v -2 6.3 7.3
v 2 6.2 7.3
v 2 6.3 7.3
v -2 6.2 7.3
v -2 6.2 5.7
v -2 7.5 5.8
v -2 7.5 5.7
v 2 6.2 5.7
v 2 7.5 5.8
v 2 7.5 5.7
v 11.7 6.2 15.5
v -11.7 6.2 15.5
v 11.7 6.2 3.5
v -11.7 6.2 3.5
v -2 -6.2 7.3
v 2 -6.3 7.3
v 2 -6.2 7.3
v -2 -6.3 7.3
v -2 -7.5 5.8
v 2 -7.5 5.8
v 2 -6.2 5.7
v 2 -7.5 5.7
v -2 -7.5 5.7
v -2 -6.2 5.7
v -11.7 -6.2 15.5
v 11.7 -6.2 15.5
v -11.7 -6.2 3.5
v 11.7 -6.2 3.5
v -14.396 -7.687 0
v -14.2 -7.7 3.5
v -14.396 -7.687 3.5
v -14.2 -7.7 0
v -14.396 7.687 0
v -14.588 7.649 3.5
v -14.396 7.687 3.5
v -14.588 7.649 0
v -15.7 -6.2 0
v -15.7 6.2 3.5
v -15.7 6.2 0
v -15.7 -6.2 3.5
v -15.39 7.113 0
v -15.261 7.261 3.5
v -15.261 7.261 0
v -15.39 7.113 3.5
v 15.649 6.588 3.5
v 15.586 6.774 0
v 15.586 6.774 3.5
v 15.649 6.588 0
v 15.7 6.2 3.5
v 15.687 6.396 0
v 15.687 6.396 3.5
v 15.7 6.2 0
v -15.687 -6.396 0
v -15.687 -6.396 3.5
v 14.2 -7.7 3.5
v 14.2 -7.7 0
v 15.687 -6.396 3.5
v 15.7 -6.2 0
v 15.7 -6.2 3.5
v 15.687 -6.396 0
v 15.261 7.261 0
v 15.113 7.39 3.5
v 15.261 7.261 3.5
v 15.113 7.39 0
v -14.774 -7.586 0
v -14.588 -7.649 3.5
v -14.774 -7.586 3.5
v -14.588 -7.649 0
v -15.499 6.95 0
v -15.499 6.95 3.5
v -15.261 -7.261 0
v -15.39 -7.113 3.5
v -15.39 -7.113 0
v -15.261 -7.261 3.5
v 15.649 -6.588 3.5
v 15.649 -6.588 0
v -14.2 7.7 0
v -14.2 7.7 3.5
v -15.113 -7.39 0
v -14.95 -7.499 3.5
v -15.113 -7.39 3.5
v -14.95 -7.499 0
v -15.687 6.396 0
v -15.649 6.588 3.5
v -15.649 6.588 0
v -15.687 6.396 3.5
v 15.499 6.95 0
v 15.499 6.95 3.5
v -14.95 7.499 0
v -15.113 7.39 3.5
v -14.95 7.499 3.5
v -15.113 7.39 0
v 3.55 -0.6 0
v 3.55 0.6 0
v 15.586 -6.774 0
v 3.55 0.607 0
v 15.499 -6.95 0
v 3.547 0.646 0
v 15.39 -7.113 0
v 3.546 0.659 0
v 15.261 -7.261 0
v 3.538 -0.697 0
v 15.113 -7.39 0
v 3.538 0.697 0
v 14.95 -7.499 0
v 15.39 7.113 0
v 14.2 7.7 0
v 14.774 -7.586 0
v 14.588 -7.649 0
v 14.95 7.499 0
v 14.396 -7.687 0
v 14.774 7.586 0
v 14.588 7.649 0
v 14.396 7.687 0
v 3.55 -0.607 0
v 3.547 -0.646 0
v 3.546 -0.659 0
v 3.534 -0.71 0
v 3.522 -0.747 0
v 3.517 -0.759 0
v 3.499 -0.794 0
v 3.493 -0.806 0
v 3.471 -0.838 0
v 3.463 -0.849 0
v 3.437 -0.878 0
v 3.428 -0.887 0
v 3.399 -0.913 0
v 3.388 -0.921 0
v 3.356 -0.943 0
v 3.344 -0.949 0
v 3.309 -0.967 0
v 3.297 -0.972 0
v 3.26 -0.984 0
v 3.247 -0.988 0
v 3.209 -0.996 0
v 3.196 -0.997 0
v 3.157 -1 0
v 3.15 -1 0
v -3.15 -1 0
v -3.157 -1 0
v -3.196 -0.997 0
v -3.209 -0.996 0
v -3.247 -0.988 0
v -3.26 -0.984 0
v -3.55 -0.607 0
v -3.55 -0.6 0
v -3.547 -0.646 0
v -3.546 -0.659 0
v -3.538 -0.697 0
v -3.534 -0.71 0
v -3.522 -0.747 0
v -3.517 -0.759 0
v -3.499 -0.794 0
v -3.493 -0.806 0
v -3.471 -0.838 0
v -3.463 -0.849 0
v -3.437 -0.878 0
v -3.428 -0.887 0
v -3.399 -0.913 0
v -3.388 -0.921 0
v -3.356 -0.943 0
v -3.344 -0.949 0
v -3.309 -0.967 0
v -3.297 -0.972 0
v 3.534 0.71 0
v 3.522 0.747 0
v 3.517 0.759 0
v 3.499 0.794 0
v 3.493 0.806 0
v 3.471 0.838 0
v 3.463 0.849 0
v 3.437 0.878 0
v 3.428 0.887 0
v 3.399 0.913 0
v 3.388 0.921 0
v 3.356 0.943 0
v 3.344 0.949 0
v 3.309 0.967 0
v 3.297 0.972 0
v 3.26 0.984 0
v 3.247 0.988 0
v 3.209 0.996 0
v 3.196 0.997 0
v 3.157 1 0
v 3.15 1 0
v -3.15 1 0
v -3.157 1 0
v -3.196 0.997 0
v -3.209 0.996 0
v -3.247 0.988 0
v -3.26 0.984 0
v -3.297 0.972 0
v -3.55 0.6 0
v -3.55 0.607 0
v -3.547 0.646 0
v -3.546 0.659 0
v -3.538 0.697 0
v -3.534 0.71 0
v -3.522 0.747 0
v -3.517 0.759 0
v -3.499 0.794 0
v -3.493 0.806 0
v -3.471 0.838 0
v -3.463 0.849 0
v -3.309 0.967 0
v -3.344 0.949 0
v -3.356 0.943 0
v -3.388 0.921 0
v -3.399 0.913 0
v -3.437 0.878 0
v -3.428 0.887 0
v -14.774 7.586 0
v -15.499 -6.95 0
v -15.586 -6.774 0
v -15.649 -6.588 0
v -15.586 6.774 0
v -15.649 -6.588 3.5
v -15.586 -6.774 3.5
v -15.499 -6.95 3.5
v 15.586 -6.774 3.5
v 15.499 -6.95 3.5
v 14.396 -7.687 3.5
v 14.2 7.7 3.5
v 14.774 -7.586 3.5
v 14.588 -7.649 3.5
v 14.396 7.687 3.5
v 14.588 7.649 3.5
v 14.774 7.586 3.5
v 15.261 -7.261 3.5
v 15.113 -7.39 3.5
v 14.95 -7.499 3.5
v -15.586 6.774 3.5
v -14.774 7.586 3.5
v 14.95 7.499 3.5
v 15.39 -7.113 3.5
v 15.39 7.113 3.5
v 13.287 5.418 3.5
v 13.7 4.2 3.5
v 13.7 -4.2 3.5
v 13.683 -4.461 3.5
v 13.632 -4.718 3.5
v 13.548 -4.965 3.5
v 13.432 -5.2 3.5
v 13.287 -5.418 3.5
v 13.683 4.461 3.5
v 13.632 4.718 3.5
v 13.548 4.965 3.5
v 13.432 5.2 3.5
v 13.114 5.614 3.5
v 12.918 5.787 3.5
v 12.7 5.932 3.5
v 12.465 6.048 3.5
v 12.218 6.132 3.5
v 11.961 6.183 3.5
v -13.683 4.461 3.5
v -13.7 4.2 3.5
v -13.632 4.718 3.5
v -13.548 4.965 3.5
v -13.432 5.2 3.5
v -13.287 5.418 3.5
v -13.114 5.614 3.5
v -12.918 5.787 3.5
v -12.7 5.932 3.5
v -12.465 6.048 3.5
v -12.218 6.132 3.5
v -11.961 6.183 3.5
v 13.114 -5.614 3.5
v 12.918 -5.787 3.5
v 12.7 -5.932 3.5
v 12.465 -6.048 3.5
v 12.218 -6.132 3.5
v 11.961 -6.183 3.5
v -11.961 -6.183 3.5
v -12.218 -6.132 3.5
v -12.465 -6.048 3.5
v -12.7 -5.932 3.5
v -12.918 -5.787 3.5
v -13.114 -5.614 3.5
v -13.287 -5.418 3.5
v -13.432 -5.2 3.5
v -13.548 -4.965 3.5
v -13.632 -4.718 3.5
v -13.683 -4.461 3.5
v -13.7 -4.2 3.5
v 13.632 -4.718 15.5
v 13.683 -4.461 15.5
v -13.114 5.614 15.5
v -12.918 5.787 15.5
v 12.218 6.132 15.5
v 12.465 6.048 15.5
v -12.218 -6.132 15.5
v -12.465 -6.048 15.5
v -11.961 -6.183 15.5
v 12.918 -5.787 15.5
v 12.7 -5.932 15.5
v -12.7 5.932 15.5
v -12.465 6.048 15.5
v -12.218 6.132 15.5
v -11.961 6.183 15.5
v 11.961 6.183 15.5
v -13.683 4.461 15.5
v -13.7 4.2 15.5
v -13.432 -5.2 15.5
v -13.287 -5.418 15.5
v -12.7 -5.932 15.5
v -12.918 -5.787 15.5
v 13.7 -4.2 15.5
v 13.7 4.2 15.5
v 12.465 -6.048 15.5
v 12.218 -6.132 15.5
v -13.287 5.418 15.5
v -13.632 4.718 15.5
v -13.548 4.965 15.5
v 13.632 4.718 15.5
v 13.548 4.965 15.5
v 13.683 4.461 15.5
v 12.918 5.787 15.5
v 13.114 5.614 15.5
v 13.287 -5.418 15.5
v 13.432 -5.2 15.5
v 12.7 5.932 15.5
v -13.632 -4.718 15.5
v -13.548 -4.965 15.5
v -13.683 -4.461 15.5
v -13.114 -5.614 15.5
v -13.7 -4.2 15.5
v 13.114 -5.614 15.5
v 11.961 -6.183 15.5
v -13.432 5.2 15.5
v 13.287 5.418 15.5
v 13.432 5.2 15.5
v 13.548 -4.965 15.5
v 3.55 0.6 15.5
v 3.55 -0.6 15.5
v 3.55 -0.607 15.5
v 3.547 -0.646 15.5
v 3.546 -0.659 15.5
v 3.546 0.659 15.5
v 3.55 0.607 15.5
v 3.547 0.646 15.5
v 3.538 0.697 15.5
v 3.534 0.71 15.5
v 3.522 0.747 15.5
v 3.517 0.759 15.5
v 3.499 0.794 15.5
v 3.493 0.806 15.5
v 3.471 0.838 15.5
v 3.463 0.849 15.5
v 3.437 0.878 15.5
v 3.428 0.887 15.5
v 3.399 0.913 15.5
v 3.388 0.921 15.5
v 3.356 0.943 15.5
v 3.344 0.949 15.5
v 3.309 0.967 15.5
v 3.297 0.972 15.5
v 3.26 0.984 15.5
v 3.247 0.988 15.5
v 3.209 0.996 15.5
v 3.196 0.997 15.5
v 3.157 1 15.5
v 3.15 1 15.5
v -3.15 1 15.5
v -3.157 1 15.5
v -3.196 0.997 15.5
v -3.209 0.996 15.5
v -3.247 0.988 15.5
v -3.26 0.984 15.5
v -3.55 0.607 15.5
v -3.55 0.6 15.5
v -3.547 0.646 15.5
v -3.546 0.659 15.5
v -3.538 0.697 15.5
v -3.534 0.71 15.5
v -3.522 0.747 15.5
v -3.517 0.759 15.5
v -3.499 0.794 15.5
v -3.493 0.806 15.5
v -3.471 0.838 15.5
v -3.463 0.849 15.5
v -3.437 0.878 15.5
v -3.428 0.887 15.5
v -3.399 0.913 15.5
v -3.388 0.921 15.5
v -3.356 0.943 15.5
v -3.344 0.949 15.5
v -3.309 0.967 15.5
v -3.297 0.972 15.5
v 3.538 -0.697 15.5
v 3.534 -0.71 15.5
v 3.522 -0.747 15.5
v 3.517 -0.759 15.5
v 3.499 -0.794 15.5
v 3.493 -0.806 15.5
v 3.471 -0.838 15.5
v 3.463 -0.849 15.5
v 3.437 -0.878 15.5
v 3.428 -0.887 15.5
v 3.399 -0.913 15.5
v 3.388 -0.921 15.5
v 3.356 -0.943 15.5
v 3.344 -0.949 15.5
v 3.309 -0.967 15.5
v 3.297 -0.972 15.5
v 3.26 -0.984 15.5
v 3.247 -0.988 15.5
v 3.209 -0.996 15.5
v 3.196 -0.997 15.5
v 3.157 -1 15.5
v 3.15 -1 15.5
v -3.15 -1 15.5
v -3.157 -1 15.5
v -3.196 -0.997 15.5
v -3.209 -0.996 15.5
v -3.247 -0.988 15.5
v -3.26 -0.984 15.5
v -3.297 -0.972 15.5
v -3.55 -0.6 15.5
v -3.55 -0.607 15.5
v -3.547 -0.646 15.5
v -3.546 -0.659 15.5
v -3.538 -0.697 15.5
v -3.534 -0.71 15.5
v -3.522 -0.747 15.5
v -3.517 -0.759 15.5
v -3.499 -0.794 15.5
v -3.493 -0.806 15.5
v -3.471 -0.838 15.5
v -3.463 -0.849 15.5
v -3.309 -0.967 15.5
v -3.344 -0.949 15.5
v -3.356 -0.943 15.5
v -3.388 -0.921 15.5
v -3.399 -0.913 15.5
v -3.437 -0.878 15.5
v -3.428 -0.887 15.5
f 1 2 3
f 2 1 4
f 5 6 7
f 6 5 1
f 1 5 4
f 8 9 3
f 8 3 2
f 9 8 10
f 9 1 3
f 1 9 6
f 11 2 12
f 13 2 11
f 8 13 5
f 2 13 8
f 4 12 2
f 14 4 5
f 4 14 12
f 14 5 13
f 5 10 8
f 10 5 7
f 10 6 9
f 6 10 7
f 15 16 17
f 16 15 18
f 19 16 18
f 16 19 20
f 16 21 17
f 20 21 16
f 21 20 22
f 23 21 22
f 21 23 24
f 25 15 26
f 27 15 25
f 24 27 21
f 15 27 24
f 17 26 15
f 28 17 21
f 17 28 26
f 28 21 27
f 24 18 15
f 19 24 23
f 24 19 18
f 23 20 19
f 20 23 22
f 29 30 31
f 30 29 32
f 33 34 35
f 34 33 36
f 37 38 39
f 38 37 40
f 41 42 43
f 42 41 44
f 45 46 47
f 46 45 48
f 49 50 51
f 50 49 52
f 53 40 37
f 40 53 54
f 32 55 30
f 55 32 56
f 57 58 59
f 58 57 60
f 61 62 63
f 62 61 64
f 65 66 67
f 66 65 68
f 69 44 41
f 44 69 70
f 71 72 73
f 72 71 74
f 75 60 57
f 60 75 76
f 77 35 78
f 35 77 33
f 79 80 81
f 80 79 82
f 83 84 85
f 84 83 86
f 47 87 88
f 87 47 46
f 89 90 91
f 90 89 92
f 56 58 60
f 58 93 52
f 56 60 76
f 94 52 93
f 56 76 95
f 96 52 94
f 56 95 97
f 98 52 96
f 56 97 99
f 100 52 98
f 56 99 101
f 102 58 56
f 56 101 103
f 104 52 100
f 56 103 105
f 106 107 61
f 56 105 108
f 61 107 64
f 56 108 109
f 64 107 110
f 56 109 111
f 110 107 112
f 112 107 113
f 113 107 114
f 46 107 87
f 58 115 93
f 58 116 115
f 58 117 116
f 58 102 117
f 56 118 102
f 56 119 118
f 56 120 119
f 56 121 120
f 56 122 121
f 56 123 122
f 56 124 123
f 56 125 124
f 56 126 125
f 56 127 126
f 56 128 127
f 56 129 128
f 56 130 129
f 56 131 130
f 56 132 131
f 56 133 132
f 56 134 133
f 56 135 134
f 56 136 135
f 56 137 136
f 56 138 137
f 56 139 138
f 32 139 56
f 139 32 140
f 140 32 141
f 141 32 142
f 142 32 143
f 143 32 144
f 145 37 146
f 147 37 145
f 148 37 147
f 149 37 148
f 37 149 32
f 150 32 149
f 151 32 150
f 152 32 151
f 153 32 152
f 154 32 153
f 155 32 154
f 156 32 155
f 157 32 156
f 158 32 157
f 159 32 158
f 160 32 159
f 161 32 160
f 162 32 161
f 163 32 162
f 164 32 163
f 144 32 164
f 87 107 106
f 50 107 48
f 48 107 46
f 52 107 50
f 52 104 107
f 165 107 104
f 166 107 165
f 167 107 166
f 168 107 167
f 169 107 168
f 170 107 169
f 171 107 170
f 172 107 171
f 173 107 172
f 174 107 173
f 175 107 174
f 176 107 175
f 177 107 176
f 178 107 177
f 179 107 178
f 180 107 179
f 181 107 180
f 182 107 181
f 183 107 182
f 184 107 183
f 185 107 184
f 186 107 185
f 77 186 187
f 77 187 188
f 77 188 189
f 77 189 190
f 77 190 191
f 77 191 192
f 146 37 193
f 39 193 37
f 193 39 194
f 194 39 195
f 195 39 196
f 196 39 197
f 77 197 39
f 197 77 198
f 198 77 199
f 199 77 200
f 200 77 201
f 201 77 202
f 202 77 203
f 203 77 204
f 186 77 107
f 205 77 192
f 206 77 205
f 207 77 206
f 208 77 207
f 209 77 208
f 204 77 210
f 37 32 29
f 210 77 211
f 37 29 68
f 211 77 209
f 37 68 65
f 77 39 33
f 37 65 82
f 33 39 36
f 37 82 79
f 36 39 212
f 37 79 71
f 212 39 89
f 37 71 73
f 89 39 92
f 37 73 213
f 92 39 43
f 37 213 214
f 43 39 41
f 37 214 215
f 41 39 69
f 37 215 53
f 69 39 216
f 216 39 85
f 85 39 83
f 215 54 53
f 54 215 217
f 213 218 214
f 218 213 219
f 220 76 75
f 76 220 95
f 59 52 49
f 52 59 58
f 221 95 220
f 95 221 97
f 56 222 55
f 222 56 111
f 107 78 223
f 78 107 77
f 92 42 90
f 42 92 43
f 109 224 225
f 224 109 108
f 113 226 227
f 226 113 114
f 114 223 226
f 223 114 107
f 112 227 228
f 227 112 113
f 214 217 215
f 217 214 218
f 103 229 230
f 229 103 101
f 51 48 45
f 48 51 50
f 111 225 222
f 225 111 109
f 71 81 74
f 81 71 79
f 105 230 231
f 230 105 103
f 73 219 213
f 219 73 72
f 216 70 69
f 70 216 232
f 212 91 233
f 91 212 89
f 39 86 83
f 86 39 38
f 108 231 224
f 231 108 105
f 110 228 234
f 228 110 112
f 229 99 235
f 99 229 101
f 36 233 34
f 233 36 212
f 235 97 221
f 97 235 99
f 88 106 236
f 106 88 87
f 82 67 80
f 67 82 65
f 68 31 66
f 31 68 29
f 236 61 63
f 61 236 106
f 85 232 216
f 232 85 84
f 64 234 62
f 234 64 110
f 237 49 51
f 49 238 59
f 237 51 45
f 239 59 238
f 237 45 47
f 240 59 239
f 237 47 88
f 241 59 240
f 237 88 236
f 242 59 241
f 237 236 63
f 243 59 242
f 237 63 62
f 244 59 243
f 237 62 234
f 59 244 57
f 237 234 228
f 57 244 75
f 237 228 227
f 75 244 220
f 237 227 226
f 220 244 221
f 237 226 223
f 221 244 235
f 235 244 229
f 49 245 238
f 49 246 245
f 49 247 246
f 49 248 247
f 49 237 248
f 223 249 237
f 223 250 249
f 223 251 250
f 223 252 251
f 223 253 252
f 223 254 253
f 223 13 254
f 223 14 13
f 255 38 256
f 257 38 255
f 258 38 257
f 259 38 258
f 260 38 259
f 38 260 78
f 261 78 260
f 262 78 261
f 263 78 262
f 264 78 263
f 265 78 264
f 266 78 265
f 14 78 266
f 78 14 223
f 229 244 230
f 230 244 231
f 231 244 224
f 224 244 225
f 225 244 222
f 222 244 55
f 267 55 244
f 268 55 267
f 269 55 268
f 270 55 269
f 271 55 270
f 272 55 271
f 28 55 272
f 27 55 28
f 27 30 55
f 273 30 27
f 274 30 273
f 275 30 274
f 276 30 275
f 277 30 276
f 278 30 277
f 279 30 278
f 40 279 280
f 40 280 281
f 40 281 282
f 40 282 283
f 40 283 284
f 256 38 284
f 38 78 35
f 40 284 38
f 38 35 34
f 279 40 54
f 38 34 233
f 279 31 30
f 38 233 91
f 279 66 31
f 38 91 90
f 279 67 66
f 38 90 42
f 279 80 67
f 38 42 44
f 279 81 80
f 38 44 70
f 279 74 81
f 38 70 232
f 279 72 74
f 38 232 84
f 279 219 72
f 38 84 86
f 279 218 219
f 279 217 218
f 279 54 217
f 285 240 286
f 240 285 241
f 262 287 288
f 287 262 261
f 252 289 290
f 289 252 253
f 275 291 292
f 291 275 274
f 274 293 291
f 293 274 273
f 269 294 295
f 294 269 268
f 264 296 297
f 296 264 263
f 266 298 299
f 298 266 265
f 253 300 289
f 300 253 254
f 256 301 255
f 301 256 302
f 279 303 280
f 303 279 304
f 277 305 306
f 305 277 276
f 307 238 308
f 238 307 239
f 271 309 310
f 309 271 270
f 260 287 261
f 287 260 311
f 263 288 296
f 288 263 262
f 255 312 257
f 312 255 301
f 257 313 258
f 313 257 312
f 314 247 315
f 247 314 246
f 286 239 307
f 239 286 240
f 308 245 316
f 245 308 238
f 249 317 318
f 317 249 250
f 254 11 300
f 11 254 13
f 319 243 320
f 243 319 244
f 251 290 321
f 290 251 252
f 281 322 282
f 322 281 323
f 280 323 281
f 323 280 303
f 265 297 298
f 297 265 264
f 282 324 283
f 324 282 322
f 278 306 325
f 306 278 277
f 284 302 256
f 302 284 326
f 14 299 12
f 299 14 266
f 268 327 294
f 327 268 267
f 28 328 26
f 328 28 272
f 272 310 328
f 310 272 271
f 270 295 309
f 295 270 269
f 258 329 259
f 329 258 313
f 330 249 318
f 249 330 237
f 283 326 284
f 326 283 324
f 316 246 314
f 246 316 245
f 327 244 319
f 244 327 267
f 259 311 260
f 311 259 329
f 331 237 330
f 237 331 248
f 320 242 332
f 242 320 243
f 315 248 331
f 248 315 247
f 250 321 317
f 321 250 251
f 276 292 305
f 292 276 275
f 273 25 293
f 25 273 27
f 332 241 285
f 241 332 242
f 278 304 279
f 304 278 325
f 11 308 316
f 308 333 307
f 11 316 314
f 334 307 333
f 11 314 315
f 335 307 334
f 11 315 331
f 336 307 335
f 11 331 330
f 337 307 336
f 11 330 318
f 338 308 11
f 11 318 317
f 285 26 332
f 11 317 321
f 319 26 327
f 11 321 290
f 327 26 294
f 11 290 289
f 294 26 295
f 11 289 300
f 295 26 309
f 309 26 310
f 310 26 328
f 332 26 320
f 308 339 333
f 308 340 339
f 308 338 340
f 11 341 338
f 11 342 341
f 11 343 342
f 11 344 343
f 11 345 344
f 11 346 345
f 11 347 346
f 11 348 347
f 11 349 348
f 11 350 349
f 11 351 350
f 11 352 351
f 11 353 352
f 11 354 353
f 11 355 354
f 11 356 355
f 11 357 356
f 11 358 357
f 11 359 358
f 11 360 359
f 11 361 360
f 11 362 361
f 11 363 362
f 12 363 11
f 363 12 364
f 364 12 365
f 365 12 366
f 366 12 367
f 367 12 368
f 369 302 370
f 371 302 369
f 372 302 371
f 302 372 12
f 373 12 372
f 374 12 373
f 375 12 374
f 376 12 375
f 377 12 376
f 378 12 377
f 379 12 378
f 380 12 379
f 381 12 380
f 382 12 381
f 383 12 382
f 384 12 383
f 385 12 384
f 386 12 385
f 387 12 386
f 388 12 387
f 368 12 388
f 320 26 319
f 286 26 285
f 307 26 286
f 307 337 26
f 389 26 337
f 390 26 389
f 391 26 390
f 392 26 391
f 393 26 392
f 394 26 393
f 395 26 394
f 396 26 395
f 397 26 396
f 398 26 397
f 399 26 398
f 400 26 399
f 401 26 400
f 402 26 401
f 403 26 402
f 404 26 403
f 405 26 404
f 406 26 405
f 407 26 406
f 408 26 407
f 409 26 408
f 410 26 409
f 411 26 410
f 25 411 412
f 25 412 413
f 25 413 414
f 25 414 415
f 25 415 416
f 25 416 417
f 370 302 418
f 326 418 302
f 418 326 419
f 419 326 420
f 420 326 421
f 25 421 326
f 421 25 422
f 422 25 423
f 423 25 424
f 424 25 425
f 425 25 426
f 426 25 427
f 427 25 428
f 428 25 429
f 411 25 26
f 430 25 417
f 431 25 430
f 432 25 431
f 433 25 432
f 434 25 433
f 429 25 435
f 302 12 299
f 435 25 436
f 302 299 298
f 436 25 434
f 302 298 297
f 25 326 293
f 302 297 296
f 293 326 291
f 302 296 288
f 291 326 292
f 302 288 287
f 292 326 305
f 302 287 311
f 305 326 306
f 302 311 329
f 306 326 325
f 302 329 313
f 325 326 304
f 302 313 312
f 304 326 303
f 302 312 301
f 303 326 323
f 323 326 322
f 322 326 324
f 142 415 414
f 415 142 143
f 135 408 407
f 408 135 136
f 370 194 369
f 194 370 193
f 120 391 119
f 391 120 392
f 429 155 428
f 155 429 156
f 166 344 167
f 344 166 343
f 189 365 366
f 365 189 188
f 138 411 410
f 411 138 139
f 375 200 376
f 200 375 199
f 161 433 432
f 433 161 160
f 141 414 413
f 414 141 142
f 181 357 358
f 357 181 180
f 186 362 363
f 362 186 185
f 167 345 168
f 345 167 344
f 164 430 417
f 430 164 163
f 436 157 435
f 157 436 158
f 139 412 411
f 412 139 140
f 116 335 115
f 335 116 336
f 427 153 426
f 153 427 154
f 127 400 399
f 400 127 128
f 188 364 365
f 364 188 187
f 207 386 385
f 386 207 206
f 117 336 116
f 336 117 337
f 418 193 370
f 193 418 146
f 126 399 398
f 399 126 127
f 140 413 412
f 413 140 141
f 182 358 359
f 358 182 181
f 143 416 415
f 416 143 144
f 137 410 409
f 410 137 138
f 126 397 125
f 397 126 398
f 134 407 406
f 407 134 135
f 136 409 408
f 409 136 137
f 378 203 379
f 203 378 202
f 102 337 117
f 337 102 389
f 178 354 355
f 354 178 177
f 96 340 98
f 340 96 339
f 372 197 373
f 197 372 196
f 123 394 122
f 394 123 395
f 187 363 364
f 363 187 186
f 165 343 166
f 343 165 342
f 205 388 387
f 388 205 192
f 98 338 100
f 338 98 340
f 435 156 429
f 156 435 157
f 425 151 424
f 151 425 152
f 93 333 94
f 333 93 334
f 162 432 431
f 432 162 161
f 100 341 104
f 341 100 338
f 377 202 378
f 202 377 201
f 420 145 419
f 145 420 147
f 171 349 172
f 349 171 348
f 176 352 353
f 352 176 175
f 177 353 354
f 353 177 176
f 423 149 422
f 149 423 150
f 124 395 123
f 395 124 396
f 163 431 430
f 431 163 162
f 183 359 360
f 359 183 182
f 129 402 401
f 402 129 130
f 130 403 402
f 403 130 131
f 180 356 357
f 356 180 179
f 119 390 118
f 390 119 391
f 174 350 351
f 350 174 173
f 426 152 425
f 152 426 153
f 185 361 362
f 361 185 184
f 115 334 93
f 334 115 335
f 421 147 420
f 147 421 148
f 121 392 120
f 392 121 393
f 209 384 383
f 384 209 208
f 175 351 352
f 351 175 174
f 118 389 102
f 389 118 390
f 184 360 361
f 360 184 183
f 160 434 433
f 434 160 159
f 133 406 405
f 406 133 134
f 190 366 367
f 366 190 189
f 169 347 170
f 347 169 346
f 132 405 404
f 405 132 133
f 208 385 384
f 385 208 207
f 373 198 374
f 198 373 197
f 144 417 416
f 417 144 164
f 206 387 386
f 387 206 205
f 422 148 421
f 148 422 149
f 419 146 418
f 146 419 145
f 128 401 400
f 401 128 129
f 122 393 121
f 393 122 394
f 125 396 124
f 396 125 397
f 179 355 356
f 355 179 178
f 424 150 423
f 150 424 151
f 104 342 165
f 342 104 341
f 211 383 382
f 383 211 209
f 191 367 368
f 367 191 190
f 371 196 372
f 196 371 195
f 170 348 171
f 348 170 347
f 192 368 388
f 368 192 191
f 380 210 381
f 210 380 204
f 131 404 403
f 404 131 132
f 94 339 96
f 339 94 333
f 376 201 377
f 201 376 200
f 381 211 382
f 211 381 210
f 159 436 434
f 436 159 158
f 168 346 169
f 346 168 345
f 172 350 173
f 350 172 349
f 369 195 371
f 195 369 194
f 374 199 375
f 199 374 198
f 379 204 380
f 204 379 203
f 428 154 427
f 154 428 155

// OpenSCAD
// file: parameters.scad
// ============================================
// MODULAR CABLE ORGANIZER - SHARED PARAMETERS
// ============================================
// All dimensions in mm - include this in all files
// ============================================

$fn = 48;

// === TOLERANCES ===
clearance = 0.3;
port_clearance = 0.1;  // Extra clearance for port openings (reduced - 0.2 was too loose for USB-C)
wall = 1.6;

// === SLOT DIMENSIONS (2:1 aspect ratio) - scaled to 2/3 ===
slot_width = 32;  // Reduced by 1mm for more compact insert
slot_height = 16;  // Reduced by 1mm for more compact insert
slot_depth = 4;  // Reduced from 6mm - less frame depth needed

// === FRAME STRUCTURE ===
frame_wall = 0.5;   // Reduced for more compact frame
frame_border = 8;  // Increased by 10mm for mounting holes with countersink
frame_back = 2;     // Slightly thicker for snap catch strength
mount_hole_dia = 3;
countersink_dia = 6;  // Diameter of countersink for screw heads
countersink_depth = 2;  // Depth of countersink

// === GRID ===
grid_cols = 2;
grid_rows = 2;

// === INSERT BASE DIMENSIONS ===
insert_width = slot_width - (2 * clearance);
insert_height = slot_height - (2 * clearance);
insert_base_depth = slot_depth - 0.5;

// === INSERT BODY (protrudes from frame) ===
insert_body_width = insert_width - 4;
insert_body_height = insert_height - 3;
insert_body_depth = 12;  // Deep enough to accommodate male cable connectors
insert_top_thick = 1.5;  // Top platform thickness

// === SNAP TABS (on neck/body - catch on back plate) ===
snap_tab_width = 4;
snap_tab_protrude = 1.2;  // How far tab sticks out from body
snap_tab_thick = 1.5;     // Z thickness of tab
snap_tab_offset = 2.2;      // Distance from base to tab bottom on insert (increased to clear frame)

// === CONNECTOR PORT DIMENSIONS & BODY DEPTHS ===
// Port dimensions from reference blueprints
// Body depths sized to match typical male connector lengths

// USB-C: 8.4 x 2.6mm, male connector ~9mm
usbc_w = 8.4;
usbc_h = 2.6;
usbc_r = 1.0;
usbc_body_depth = 9;

// USB-A: 14.0 x 6.5mm, male connector ~13mm
usba_w = 14.0;
usba_h = 6.5;
usba_r = 0.5;
usba_body_depth = 13;

// USB Mini: 6.9 x 3.0mm, male connector ~9mm
usb_mini_w = 6.9;
usb_mini_h = 3.0;
usb_mini_r = 0.5;
usb_mini_body_depth = 9;

// USB Micro: 6.9 x 1.8mm, male connector ~7mm
usb_micro_w = 6.9;
usb_micro_h = 1.8;
usb_micro_r = 0.3;
usb_micro_body_depth = 7;

// USB-B: 8.0 x 7.5mm, male connector ~14mm
usb_b_w = 8.0;
usb_b_h = 7.5;
usb_b_r = 1.0;
usb_b_body_depth = 14;

// Lightning: 6.7 x 1.5mm, male connector ~8mm
lightning_w = 6.7;
lightning_h = 1.5;
lightning_r = 0.5;
lightning_body_depth = 8;

// HDMI: 14.0 x 4.5mm, male connector ~16mm
hdmi_w = 14.0;
hdmi_h = 4.5;
hdmi_r = 0.5;
hdmi_body_depth = 16;

// 3.5mm Audio Jack: male plug ~14mm
audio_jack_dia = 6.0;
audio_jack_body_depth = 14;

// Blank/Label: recessed area for label
label_w = 30;
label_h = 12;
label_depth = 0.8;

// === CALCULATED VALUES ===
frame_total_depth = frame_back + slot_depth;
grid_width = (grid_cols * slot_width) + ((grid_cols - 1) * frame_wall);
grid_height = (grid_rows * slot_height) + ((grid_rows - 1) * frame_wall);
frame_width = grid_width + (2 * frame_border);
frame_height_total = grid_height + (2 * frame_border);
insert_total_depth = insert_base_depth + insert_body_depth;
// file: insert_base.scad
// ============================================
// MODULAR CABLE ORGANIZER - BASE INSERT MODULE
// ============================================
// This is the parent module for all insert types
// Include this file and call insert_with_port() with a port shape
// ============================================

include <parameters.scad>

// === BASE INSERT WITH CUSTOM BODY DEPTH ===
module insert_blank_custom(body_depth) {
    union() {
        // Base plate (sits in frame slot)
        rounded_box_rect(insert_width, insert_height, insert_base_depth, 1.5);
        
        // Body (protrudes out front) - custom depth
        translate([0, 0, insert_base_depth])
            rounded_box_rect(insert_body_width, insert_body_height, body_depth, 2);
        
        // Snap tabs on all 4 sides
        snap_tabs_all();
    }
}

// === BASE INSERT (default depth - for backwards compatibility) ===
module insert_blank() {
    insert_blank_custom(insert_body_depth);
}

// === INSERT WITH THROUGH-HOLE PORT (custom depth) ===
// Pass body_depth and a 2D shape as children
module insert_with_port_custom(body_depth) {
    total_depth = insert_base_depth + body_depth;
    difference() {
        insert_blank_custom(body_depth);
        
        // Cut port hole ALL THE WAY through (tube shape)
        translate([0, 0, -0.1])
            linear_extrude(total_depth + 0.2)
            offset(r=port_clearance)  // Add clearance to port opening
            children();
    }
}

// === INSERT WITH THROUGH-HOLE PORT (default depth) ===
module insert_with_port() {
    insert_with_port_custom(insert_body_depth) children();
}

// === PRE-MADE INSERT MODULES WITH CORRECT DEPTHS ===
module insert_usbc() {
    insert_with_port_custom(usbc_body_depth) port_usbc();
}

module insert_usba() {
    insert_with_port_custom(usba_body_depth) port_usba();
}

module insert_usb_mini() {
    insert_with_port_custom(usb_mini_body_depth) port_usb_mini();
}

module insert_usb_micro() {
    insert_with_port_custom(usb_micro_body_depth) port_usb_micro();
}

module insert_usb_b() {
    insert_with_port_custom(usb_b_body_depth) port_usb_b();
}

module insert_lightning() {
    insert_with_port_custom(lightning_body_depth) port_lightning();
}

module insert_hdmi() {
    insert_with_port_custom(hdmi_body_depth) port_hdmi();
}

module insert_audio_jack() {
    insert_with_port_custom(audio_jack_body_depth) port_audio_jack();
}

// === SNAP TABS (on neck/body - catch on frame cutouts) ===
// Tabs are on the body, positioned to engage with frame wall cutouts
module snap_tabs_all() {
    // Position tabs up on body (clear of base/frame)
    tab_z = insert_base_depth + snap_tab_offset;
    
    // Tabs on all 4 sides of the body
    for (angle = [0, 90, 180, 270]) {
        rotate([0, 0, angle])
            translate([0, insert_body_height/2, tab_z])
            neck_snap_tab();
    }
}

module neck_snap_tab() {
    // Wedge shape (FLIPPED): 
    // - Peak/taper on BOTTOM - slides past back plate when inserting
    // - Flat on TOP - catches and holds
    hull() {
        // Peak of wedge (protruding, at BOTTOM of tab)
        translate([-snap_tab_width/2, snap_tab_protrude, 0])
            cube([snap_tab_width, 0.1, 0.1]);
        // Flat top (at body surface, TOP of tab)
        translate([-snap_tab_width/2, 0, snap_tab_thick])
            cube([snap_tab_width, 0.1, 0.1]);
        // Base of wedge (at body surface, bottom)
        translate([-snap_tab_width/2, 0, 0])
            cube([snap_tab_width, 0.1, 0.1]);
    }
}

module snap_tab_horizontal() {
    hull() {
        translate([0, -snap_tab_protrude/2, 0])
            cube([snap_tab_width, 0.1, snap_tab_thick], center=true);
        translate([0, snap_tab_protrude/2, snap_tab_thick * 0.2])
            cube([snap_tab_width, 0.1, snap_tab_thick * 0.6], center=true);
    }
}

module snap_tab_vertical() {
    hull() {
        translate([-snap_tab_protrude/2, 0, 0])
            cube([0.1, snap_tab_width, snap_tab_thick], center=true);
        translate([snap_tab_protrude/2, 0, snap_tab_thick * 0.2])
            cube([0.1, snap_tab_width, snap_tab_thick * 0.6], center=true);
    }
}

// === UTILITY MODULES ===
module rounded_box_rect(w, d, h, r) {
    translate([0, 0, h/2])
        hull() {
            for (x = [-1, 1], y = [-1, 1])
                translate([x * (w/2 - r), y * (d/2 - r), 0])
                    cylinder(h=h, r=r, center=true);
        }
}

// === PORT SHAPE MODULES (2D) ===
// These define the cutout shapes for each connector type

module port_rounded_rect(w, h, r) {
    // Standard rounded rectangle
    hull() {
        for (x = [-1, 1], y = [-1, 1])
            translate([x * (w/2 - r), y * (h/2 - r)])
                circle(r=r);
    }
}

module port_usbc() {
    port_rounded_rect(usbc_w, usbc_h, usbc_r);
}

module port_usba() {
    port_rounded_rect(usba_w, usba_h, usba_r);
}

module port_usb_mini() {
    port_rounded_rect(usb_mini_w, usb_mini_h, usb_mini_r);
}

module port_usb_micro() {
    port_rounded_rect(usb_micro_w, usb_micro_h, usb_micro_r);
}

module port_usb_b() {
    // USB-B has beveled top corners
    hull() {
        // Bottom corners (full radius)
        for (x = [-1, 1])
            translate([x * (usb_b_w/2 - usb_b_r), -(usb_b_h/2 - usb_b_r)])
                circle(r=usb_b_r);
        // Top corners (chamfered - moved inward)
        for (x = [-1, 1])
            translate([x * (usb_b_w/2 - usb_b_r - 1), (usb_b_h/2 - usb_b_r)])
                circle(r=usb_b_r);
    }
}

module port_lightning() {
    port_rounded_rect(lightning_w, lightning_h, lightning_r);
}

module port_hdmi() {
    // HDMI is tapered (wider at top)
    hull() {
        // Top (wider)
        for (x = [-1, 1])
            translate([x * (hdmi_w/2 - hdmi_r), (hdmi_h/2 - hdmi_r)])
                circle(r=hdmi_r);
        // Bottom (narrower)
        for (x = [-1, 1])
            translate([x * (hdmi_w/2 - hdmi_r - 1), -(hdmi_h/2 - hdmi_r)])
                circle(r=hdmi_r);
    }
}

module port_audio_jack() {
    circle(d=audio_jack_dia);
}

module port_label_recess() {
    // Shallow rectangular recess for labels
    square([label_w, label_h], center=true);
}

// === RENDER (for testing this file directly) ===
// insert_blank();
// main file
// ============================================
// USB MICRO FEMALE INSERT
// Port: 6.9mm x 1.8mm rounded rectangle
// ============================================

include <insert_base.scad>

module insert_usb_micro() {
    insert_with_port() port_usb_micro();
}

// Render
insert_usb_micro();
